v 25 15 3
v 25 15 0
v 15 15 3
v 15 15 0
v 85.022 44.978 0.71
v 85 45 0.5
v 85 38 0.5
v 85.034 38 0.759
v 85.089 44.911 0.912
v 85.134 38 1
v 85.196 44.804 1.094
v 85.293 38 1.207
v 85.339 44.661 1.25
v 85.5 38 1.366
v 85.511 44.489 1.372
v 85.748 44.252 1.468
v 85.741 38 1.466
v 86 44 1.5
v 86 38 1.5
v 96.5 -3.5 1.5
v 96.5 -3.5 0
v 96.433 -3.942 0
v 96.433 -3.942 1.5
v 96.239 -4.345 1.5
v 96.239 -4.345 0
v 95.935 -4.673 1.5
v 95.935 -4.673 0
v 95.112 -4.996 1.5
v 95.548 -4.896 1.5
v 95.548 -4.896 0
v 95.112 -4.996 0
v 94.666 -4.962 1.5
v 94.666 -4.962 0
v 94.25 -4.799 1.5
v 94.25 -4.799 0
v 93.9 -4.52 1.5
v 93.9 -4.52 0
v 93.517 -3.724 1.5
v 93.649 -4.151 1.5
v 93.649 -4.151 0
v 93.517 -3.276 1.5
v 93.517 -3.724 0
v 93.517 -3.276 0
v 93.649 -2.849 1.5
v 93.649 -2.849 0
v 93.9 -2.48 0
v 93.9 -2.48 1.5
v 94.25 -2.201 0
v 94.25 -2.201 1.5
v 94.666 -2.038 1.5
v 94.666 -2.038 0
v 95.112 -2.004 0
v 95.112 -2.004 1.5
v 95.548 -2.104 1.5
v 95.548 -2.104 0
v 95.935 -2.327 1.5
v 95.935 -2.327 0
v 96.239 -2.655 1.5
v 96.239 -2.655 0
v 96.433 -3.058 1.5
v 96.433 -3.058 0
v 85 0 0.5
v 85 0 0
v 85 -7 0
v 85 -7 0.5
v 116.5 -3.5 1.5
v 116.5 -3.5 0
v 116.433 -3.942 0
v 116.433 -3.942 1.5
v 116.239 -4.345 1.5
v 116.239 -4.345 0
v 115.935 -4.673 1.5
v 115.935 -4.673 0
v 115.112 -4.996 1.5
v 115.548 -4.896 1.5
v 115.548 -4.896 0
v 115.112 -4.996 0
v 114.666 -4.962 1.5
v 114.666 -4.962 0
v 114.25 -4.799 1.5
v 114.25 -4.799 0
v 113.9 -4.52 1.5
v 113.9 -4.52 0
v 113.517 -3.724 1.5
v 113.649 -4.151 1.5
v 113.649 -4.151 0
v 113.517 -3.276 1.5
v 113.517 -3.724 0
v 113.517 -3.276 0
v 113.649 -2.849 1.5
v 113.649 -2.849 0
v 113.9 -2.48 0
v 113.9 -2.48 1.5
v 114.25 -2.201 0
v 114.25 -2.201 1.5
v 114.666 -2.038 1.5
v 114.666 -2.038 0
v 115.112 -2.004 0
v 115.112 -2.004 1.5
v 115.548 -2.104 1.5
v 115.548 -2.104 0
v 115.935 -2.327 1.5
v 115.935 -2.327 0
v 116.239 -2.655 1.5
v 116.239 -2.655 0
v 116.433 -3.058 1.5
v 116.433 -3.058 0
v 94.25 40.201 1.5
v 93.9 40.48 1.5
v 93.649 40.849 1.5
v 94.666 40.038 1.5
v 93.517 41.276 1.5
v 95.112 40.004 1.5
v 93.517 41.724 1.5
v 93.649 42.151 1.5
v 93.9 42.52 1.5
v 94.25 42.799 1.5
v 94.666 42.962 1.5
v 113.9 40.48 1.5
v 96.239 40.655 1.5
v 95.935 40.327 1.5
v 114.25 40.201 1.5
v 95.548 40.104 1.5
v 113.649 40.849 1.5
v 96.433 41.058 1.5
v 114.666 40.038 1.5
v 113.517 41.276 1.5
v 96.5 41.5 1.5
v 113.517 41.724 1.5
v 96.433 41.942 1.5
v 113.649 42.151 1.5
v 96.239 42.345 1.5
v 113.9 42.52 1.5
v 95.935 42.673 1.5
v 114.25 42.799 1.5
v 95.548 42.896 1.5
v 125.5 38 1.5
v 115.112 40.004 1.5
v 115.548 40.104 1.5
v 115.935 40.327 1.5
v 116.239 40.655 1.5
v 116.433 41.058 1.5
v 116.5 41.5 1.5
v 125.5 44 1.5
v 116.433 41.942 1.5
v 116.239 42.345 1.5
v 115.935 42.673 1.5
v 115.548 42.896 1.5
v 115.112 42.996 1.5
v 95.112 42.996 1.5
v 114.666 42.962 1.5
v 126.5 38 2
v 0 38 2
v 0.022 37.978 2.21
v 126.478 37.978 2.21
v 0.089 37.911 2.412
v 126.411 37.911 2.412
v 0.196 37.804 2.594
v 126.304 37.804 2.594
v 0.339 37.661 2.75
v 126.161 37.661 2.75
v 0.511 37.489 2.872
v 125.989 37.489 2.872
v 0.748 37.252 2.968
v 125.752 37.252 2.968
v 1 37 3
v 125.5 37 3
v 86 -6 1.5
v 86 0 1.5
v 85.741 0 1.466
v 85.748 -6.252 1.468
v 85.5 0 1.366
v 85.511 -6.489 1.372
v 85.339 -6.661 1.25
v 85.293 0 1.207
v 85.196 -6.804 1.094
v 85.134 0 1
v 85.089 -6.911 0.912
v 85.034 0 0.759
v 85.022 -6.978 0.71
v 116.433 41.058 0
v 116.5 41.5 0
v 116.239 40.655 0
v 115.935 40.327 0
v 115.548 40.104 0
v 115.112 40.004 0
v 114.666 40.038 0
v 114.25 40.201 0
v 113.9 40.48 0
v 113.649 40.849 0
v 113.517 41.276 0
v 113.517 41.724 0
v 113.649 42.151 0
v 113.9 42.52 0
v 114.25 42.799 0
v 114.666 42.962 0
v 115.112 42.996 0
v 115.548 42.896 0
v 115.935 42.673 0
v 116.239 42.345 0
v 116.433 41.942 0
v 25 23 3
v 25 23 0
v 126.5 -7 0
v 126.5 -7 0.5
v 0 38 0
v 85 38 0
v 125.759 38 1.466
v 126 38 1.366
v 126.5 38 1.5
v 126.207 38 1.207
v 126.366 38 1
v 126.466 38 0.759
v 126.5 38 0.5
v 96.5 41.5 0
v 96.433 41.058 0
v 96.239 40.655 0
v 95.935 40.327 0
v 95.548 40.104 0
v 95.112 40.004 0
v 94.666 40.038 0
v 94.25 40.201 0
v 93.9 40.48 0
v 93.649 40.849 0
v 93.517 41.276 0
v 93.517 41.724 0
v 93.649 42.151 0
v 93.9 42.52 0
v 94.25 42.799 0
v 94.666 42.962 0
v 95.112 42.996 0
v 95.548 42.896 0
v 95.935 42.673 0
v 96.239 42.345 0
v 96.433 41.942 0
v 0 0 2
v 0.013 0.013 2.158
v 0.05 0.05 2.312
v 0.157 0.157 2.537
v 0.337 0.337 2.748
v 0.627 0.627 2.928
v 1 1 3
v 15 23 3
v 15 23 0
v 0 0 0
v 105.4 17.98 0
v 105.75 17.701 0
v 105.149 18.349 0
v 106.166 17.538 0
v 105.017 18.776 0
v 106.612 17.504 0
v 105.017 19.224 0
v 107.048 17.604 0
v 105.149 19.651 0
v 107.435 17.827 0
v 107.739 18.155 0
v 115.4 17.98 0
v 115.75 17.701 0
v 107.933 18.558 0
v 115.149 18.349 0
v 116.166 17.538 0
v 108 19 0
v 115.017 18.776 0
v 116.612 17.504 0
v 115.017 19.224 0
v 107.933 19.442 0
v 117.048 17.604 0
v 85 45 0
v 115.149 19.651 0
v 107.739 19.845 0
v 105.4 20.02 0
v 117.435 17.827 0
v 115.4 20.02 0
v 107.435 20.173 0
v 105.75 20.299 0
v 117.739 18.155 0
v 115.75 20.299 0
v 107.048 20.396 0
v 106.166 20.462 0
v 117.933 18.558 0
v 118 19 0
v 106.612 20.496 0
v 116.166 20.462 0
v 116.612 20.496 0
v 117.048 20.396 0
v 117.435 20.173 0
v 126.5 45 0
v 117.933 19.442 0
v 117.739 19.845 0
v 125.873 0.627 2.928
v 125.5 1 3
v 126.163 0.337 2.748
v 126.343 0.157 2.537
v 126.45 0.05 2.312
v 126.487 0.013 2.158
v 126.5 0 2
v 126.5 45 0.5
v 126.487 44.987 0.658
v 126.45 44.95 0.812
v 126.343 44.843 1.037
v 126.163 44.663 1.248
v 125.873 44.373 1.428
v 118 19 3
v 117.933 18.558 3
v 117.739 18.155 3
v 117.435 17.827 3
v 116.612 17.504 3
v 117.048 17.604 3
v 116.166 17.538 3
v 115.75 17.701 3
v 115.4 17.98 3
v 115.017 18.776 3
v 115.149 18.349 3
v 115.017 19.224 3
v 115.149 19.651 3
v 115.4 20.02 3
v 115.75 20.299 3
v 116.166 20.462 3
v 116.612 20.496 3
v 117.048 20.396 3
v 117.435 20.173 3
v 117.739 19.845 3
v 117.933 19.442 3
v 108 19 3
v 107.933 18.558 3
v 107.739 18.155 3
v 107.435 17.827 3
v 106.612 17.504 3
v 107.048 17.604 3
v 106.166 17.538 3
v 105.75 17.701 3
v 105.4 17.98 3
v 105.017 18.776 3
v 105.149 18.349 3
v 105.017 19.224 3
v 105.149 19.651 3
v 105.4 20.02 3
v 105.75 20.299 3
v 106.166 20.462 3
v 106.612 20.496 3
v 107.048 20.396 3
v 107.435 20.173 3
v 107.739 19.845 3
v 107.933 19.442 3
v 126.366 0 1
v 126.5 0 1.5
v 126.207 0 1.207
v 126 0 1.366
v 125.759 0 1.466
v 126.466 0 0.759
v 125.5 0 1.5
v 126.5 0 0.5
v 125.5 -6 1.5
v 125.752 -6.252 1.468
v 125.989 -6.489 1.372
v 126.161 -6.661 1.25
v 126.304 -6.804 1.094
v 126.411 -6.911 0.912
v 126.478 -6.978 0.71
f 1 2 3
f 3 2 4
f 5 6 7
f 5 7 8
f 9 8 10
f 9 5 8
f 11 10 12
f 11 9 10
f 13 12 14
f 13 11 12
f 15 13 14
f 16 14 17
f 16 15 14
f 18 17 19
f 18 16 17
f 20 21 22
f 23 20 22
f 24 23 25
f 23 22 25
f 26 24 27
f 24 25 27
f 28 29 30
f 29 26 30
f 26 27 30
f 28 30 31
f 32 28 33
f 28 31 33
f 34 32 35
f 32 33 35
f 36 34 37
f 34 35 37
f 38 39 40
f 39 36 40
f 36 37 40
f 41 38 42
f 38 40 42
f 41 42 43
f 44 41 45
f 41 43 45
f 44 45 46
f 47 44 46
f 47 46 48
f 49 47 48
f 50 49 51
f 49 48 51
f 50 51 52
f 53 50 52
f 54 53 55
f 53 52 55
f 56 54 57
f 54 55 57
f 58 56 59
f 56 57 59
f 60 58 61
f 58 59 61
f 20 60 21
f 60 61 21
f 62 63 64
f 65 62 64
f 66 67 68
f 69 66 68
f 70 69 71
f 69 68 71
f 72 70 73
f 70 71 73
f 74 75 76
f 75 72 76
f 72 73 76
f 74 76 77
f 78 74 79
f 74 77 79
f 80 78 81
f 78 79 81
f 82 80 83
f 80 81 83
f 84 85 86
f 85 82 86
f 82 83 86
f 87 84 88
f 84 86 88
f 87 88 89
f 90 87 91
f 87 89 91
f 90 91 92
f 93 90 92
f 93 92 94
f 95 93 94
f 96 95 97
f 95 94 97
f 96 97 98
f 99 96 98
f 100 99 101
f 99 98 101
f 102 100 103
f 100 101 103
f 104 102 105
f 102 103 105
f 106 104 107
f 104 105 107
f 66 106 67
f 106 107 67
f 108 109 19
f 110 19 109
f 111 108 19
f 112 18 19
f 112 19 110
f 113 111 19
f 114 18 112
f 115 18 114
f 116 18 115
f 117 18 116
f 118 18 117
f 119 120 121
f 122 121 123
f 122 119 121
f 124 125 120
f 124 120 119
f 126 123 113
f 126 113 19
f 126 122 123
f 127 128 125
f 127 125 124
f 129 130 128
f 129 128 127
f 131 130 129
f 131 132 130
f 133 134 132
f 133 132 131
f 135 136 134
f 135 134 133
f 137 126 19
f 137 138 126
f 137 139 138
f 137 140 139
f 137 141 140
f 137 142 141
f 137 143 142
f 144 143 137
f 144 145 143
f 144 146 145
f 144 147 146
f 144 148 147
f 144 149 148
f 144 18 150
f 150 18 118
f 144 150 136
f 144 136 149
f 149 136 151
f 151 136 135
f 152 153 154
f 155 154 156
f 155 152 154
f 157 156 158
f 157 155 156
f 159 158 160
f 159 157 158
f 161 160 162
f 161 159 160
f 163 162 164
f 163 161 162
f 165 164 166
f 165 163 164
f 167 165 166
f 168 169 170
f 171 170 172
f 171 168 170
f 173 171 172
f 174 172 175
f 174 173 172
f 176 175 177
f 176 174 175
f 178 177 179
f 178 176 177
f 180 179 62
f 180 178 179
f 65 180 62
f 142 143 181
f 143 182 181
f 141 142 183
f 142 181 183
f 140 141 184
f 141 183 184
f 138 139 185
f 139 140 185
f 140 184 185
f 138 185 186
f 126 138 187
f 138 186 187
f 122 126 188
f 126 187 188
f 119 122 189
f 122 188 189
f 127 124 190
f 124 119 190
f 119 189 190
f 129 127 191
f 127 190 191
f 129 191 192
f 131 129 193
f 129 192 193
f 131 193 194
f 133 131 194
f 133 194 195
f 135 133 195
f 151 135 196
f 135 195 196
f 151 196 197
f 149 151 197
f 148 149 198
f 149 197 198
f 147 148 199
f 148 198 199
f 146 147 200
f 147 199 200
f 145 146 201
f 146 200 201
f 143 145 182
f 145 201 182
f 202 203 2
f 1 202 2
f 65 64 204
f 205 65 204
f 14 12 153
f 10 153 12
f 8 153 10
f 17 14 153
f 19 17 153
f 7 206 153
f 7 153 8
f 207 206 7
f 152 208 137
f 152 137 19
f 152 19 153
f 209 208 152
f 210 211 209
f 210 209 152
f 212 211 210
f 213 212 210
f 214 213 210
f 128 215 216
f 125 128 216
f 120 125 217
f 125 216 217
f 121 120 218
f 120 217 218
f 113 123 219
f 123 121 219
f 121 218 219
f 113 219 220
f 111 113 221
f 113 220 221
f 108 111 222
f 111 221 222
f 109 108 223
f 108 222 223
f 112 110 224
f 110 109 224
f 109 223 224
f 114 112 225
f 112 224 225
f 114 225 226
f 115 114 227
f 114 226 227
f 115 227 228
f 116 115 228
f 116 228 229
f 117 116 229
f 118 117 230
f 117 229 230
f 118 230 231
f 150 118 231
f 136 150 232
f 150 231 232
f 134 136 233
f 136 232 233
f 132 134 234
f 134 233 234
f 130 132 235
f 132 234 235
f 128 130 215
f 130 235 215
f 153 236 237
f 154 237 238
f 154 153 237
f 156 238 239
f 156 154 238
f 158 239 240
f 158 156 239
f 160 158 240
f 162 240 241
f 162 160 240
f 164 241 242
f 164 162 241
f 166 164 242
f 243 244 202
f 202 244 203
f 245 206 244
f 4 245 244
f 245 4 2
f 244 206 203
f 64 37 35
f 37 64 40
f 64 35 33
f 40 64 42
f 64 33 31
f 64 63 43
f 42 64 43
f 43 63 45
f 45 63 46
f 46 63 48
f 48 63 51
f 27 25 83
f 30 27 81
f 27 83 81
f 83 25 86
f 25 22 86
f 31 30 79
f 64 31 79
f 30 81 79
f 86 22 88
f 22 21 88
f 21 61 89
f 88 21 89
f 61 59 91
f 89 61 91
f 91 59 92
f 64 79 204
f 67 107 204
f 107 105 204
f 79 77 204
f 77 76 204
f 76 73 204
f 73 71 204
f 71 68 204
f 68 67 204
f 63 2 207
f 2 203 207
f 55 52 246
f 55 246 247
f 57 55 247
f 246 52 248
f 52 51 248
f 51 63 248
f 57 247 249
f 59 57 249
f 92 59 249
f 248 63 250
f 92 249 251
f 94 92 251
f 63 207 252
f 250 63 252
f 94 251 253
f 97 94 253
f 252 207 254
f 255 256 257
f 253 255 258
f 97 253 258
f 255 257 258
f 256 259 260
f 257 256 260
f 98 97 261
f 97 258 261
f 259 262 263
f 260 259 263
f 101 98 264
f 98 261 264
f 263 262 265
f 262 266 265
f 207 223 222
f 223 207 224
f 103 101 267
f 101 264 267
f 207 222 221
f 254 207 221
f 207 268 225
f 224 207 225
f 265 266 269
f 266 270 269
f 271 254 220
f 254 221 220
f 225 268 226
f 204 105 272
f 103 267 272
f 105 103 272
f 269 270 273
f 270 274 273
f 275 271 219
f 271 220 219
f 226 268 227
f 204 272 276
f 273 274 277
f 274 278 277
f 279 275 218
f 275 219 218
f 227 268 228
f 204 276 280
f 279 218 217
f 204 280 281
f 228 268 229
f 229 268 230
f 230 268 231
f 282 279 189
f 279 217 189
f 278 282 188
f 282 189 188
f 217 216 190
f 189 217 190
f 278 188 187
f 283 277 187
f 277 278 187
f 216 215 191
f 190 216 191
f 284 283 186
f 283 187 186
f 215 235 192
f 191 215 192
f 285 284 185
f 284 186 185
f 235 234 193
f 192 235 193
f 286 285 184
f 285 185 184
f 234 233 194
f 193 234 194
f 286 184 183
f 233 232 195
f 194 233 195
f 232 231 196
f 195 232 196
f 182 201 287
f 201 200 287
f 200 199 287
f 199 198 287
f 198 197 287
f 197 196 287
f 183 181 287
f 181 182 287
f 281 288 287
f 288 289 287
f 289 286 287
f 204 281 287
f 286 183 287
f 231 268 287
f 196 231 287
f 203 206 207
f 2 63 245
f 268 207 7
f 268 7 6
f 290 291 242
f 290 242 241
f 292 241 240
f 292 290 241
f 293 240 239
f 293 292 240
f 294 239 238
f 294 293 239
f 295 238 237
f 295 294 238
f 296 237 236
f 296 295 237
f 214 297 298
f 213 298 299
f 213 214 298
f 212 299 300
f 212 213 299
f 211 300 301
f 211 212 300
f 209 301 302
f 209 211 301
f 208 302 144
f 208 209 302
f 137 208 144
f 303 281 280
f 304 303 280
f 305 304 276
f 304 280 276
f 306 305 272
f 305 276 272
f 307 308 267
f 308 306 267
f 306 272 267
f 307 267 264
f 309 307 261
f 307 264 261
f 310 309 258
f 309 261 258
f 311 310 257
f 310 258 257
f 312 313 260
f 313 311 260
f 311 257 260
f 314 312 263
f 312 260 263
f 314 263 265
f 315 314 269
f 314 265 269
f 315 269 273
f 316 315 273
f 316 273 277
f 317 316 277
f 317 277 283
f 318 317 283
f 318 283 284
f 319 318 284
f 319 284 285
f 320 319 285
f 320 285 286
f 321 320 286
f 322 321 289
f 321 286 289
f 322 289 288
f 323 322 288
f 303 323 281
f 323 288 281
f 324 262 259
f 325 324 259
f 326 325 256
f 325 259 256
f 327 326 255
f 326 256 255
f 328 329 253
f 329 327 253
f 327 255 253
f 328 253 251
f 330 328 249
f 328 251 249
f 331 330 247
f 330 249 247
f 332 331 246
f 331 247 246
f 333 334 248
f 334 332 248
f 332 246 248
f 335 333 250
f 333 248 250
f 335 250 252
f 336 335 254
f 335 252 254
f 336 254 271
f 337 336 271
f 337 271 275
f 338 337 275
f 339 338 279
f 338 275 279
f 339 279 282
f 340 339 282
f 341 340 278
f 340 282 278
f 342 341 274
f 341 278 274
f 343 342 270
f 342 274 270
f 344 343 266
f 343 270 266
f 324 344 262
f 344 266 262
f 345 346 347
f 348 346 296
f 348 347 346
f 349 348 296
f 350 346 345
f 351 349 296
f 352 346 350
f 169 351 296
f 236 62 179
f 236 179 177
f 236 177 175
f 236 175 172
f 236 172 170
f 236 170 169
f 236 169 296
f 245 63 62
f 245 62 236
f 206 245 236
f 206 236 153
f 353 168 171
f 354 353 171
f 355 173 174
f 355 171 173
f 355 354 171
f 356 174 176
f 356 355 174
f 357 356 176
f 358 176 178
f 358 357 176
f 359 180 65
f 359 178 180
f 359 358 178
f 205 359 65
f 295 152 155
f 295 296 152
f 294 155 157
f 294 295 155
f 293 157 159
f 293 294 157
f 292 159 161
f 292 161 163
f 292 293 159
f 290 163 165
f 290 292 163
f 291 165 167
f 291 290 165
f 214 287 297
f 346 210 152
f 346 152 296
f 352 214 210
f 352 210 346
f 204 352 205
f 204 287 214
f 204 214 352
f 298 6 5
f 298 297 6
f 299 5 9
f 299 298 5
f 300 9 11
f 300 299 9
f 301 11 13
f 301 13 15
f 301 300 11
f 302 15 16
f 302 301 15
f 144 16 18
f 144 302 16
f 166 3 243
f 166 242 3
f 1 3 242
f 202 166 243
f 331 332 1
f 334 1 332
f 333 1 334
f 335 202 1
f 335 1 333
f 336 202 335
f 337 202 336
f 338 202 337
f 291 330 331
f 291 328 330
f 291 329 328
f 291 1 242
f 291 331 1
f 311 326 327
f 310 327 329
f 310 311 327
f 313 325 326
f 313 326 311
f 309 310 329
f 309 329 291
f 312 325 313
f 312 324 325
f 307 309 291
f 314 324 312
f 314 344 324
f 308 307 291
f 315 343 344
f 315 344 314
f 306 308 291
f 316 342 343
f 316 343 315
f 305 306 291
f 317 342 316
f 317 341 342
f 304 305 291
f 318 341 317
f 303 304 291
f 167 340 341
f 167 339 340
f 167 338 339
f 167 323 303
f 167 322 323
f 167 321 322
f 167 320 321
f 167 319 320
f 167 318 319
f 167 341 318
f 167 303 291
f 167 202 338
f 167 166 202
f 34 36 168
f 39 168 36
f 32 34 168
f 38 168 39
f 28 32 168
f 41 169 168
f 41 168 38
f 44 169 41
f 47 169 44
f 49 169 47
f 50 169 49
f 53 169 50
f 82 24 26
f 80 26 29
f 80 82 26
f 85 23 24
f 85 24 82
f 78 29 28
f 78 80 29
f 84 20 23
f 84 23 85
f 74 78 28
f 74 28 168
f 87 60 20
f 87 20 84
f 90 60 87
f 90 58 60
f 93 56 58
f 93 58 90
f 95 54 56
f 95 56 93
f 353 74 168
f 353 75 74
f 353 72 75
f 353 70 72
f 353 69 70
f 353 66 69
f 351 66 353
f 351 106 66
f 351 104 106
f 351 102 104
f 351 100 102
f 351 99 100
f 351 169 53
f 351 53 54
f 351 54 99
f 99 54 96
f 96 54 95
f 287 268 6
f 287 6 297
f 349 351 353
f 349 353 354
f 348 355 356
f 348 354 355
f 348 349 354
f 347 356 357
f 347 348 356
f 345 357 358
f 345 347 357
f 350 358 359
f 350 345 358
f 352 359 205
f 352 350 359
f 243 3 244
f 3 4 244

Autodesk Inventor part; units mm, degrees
ref_plane "YZ Plane" through (0, 0, 0) normal (1, 0, 0) x (0, 1, 0)
ref_plane "XZ Plane" through (0, 0, 0) normal (0, 1, 0) x (-1, 0, 0)
ref_plane "XY Plane" through (0, 0, 0) normal (0, 0, 1) x (1, 0, 0)
sketch "sketch" plane through (0, 0, 0) normal (0, 0, 1) x (1, 0, 0)
  line L0 (-52.714, 0) -> (218.2838, 0) construction
  line L1 (0, -17.4) -> (0, 55.4) construction
  line L2 (0, 38) -> (126.5, 38)
  line L3 (126.5, 38) -> (126.5, 0)
  line L4 (126.5, 0) -> (0, 0)
  line L5 (0, 0) -> (0, 38)
  line L6 (15, 23) -> (25, 23)
  line L7 (25, 23) -> (25, 15)
  line L8 (25, 15) -> (15, 15)
  line L9 (15, 15) -> (15, 23)
  circle A0 centre (116.5, 19) radius 1.5
  circle A1 centre (106.5, 19) radius 1.5
  line L10 (85, 45) -> (126.5, 45)
  line L11 (126.5, 45) -> (126.5, 38)
  line L12 (126.5, 38) -> (85, 38)
  line L13 (85, 38) -> (85, 45)
  line L14 (-14, 19) -> (179.5698, 19) construction
  circle A2 centre (95, 41.5) radius 1.5
  circle A3 centre (115, 41.5) radius 1.5
  line L15 (85, -7) -> (126.5, -7)
  line L16 (126.5, -7) -> (126.5, 0)
  line L17 (85, 0) -> (85, -7)
  circle A4 centre (95, -3.5) radius 1.5
  circle A5 centre (115, -3.5) radius 1.5
  dimension "d0" = 126.5
  dimension "d1" = 38
  dimension "d2" = 15
  dimension "d3" = 10
  dimension "d4" = 8
  dimension "d5" = 15
  dimension "d6" = 3
  dimension "d7" = 10
  dimension "d8" = 3
  dimension "d9" = 10
  dimension "d10" = 19
  dimension "d11" = 19
  dimension "d12" = 41.5
  dimension "d13" = 7
  dimension "d14" = 19
  dimension "d15" = 10
  dimension "d16" = 11.5
  dimension "d17" = 3
  dimension "d18" = 3
  dimension "d19" = 3.5
  dimension "d20" = 3.5
extrude "roof" add sketch "sketch" along normal blind 3 contours L2 L3 L4 L5
extrude "bolt" add sketch "sketch" along normal blind 1.5 contours L13 L10 L11 L2 | L4 L16 L15 L17
fillet "so_hurt" radius 1 10 edges at (63.25, 38, 3) (63.25, 0, 3) (126.5, 19, 3) (85, -3.5, 1.5) (105.75, -7, 1.5) (126.5, 41.5, 1.5) (105.75, 45, 1.5) (85, 41.5, 1.5) (0, 19, 3) (126.5, -3.5, 1.5)
equation "\"d8\" = d6"
equation "\"d10\" = 0.5 * d1"
equation "\"d11\" = 0.5 * d1"
equation "\"d14\" = 0.5 * d1"
equation "\"d17\" = d6"
equation "\"d18\" = d6"
equation "\"d19\" = 0.5 * d13"
equation "\"d20\" = 0.5 * d13"
properties part number "roof"
